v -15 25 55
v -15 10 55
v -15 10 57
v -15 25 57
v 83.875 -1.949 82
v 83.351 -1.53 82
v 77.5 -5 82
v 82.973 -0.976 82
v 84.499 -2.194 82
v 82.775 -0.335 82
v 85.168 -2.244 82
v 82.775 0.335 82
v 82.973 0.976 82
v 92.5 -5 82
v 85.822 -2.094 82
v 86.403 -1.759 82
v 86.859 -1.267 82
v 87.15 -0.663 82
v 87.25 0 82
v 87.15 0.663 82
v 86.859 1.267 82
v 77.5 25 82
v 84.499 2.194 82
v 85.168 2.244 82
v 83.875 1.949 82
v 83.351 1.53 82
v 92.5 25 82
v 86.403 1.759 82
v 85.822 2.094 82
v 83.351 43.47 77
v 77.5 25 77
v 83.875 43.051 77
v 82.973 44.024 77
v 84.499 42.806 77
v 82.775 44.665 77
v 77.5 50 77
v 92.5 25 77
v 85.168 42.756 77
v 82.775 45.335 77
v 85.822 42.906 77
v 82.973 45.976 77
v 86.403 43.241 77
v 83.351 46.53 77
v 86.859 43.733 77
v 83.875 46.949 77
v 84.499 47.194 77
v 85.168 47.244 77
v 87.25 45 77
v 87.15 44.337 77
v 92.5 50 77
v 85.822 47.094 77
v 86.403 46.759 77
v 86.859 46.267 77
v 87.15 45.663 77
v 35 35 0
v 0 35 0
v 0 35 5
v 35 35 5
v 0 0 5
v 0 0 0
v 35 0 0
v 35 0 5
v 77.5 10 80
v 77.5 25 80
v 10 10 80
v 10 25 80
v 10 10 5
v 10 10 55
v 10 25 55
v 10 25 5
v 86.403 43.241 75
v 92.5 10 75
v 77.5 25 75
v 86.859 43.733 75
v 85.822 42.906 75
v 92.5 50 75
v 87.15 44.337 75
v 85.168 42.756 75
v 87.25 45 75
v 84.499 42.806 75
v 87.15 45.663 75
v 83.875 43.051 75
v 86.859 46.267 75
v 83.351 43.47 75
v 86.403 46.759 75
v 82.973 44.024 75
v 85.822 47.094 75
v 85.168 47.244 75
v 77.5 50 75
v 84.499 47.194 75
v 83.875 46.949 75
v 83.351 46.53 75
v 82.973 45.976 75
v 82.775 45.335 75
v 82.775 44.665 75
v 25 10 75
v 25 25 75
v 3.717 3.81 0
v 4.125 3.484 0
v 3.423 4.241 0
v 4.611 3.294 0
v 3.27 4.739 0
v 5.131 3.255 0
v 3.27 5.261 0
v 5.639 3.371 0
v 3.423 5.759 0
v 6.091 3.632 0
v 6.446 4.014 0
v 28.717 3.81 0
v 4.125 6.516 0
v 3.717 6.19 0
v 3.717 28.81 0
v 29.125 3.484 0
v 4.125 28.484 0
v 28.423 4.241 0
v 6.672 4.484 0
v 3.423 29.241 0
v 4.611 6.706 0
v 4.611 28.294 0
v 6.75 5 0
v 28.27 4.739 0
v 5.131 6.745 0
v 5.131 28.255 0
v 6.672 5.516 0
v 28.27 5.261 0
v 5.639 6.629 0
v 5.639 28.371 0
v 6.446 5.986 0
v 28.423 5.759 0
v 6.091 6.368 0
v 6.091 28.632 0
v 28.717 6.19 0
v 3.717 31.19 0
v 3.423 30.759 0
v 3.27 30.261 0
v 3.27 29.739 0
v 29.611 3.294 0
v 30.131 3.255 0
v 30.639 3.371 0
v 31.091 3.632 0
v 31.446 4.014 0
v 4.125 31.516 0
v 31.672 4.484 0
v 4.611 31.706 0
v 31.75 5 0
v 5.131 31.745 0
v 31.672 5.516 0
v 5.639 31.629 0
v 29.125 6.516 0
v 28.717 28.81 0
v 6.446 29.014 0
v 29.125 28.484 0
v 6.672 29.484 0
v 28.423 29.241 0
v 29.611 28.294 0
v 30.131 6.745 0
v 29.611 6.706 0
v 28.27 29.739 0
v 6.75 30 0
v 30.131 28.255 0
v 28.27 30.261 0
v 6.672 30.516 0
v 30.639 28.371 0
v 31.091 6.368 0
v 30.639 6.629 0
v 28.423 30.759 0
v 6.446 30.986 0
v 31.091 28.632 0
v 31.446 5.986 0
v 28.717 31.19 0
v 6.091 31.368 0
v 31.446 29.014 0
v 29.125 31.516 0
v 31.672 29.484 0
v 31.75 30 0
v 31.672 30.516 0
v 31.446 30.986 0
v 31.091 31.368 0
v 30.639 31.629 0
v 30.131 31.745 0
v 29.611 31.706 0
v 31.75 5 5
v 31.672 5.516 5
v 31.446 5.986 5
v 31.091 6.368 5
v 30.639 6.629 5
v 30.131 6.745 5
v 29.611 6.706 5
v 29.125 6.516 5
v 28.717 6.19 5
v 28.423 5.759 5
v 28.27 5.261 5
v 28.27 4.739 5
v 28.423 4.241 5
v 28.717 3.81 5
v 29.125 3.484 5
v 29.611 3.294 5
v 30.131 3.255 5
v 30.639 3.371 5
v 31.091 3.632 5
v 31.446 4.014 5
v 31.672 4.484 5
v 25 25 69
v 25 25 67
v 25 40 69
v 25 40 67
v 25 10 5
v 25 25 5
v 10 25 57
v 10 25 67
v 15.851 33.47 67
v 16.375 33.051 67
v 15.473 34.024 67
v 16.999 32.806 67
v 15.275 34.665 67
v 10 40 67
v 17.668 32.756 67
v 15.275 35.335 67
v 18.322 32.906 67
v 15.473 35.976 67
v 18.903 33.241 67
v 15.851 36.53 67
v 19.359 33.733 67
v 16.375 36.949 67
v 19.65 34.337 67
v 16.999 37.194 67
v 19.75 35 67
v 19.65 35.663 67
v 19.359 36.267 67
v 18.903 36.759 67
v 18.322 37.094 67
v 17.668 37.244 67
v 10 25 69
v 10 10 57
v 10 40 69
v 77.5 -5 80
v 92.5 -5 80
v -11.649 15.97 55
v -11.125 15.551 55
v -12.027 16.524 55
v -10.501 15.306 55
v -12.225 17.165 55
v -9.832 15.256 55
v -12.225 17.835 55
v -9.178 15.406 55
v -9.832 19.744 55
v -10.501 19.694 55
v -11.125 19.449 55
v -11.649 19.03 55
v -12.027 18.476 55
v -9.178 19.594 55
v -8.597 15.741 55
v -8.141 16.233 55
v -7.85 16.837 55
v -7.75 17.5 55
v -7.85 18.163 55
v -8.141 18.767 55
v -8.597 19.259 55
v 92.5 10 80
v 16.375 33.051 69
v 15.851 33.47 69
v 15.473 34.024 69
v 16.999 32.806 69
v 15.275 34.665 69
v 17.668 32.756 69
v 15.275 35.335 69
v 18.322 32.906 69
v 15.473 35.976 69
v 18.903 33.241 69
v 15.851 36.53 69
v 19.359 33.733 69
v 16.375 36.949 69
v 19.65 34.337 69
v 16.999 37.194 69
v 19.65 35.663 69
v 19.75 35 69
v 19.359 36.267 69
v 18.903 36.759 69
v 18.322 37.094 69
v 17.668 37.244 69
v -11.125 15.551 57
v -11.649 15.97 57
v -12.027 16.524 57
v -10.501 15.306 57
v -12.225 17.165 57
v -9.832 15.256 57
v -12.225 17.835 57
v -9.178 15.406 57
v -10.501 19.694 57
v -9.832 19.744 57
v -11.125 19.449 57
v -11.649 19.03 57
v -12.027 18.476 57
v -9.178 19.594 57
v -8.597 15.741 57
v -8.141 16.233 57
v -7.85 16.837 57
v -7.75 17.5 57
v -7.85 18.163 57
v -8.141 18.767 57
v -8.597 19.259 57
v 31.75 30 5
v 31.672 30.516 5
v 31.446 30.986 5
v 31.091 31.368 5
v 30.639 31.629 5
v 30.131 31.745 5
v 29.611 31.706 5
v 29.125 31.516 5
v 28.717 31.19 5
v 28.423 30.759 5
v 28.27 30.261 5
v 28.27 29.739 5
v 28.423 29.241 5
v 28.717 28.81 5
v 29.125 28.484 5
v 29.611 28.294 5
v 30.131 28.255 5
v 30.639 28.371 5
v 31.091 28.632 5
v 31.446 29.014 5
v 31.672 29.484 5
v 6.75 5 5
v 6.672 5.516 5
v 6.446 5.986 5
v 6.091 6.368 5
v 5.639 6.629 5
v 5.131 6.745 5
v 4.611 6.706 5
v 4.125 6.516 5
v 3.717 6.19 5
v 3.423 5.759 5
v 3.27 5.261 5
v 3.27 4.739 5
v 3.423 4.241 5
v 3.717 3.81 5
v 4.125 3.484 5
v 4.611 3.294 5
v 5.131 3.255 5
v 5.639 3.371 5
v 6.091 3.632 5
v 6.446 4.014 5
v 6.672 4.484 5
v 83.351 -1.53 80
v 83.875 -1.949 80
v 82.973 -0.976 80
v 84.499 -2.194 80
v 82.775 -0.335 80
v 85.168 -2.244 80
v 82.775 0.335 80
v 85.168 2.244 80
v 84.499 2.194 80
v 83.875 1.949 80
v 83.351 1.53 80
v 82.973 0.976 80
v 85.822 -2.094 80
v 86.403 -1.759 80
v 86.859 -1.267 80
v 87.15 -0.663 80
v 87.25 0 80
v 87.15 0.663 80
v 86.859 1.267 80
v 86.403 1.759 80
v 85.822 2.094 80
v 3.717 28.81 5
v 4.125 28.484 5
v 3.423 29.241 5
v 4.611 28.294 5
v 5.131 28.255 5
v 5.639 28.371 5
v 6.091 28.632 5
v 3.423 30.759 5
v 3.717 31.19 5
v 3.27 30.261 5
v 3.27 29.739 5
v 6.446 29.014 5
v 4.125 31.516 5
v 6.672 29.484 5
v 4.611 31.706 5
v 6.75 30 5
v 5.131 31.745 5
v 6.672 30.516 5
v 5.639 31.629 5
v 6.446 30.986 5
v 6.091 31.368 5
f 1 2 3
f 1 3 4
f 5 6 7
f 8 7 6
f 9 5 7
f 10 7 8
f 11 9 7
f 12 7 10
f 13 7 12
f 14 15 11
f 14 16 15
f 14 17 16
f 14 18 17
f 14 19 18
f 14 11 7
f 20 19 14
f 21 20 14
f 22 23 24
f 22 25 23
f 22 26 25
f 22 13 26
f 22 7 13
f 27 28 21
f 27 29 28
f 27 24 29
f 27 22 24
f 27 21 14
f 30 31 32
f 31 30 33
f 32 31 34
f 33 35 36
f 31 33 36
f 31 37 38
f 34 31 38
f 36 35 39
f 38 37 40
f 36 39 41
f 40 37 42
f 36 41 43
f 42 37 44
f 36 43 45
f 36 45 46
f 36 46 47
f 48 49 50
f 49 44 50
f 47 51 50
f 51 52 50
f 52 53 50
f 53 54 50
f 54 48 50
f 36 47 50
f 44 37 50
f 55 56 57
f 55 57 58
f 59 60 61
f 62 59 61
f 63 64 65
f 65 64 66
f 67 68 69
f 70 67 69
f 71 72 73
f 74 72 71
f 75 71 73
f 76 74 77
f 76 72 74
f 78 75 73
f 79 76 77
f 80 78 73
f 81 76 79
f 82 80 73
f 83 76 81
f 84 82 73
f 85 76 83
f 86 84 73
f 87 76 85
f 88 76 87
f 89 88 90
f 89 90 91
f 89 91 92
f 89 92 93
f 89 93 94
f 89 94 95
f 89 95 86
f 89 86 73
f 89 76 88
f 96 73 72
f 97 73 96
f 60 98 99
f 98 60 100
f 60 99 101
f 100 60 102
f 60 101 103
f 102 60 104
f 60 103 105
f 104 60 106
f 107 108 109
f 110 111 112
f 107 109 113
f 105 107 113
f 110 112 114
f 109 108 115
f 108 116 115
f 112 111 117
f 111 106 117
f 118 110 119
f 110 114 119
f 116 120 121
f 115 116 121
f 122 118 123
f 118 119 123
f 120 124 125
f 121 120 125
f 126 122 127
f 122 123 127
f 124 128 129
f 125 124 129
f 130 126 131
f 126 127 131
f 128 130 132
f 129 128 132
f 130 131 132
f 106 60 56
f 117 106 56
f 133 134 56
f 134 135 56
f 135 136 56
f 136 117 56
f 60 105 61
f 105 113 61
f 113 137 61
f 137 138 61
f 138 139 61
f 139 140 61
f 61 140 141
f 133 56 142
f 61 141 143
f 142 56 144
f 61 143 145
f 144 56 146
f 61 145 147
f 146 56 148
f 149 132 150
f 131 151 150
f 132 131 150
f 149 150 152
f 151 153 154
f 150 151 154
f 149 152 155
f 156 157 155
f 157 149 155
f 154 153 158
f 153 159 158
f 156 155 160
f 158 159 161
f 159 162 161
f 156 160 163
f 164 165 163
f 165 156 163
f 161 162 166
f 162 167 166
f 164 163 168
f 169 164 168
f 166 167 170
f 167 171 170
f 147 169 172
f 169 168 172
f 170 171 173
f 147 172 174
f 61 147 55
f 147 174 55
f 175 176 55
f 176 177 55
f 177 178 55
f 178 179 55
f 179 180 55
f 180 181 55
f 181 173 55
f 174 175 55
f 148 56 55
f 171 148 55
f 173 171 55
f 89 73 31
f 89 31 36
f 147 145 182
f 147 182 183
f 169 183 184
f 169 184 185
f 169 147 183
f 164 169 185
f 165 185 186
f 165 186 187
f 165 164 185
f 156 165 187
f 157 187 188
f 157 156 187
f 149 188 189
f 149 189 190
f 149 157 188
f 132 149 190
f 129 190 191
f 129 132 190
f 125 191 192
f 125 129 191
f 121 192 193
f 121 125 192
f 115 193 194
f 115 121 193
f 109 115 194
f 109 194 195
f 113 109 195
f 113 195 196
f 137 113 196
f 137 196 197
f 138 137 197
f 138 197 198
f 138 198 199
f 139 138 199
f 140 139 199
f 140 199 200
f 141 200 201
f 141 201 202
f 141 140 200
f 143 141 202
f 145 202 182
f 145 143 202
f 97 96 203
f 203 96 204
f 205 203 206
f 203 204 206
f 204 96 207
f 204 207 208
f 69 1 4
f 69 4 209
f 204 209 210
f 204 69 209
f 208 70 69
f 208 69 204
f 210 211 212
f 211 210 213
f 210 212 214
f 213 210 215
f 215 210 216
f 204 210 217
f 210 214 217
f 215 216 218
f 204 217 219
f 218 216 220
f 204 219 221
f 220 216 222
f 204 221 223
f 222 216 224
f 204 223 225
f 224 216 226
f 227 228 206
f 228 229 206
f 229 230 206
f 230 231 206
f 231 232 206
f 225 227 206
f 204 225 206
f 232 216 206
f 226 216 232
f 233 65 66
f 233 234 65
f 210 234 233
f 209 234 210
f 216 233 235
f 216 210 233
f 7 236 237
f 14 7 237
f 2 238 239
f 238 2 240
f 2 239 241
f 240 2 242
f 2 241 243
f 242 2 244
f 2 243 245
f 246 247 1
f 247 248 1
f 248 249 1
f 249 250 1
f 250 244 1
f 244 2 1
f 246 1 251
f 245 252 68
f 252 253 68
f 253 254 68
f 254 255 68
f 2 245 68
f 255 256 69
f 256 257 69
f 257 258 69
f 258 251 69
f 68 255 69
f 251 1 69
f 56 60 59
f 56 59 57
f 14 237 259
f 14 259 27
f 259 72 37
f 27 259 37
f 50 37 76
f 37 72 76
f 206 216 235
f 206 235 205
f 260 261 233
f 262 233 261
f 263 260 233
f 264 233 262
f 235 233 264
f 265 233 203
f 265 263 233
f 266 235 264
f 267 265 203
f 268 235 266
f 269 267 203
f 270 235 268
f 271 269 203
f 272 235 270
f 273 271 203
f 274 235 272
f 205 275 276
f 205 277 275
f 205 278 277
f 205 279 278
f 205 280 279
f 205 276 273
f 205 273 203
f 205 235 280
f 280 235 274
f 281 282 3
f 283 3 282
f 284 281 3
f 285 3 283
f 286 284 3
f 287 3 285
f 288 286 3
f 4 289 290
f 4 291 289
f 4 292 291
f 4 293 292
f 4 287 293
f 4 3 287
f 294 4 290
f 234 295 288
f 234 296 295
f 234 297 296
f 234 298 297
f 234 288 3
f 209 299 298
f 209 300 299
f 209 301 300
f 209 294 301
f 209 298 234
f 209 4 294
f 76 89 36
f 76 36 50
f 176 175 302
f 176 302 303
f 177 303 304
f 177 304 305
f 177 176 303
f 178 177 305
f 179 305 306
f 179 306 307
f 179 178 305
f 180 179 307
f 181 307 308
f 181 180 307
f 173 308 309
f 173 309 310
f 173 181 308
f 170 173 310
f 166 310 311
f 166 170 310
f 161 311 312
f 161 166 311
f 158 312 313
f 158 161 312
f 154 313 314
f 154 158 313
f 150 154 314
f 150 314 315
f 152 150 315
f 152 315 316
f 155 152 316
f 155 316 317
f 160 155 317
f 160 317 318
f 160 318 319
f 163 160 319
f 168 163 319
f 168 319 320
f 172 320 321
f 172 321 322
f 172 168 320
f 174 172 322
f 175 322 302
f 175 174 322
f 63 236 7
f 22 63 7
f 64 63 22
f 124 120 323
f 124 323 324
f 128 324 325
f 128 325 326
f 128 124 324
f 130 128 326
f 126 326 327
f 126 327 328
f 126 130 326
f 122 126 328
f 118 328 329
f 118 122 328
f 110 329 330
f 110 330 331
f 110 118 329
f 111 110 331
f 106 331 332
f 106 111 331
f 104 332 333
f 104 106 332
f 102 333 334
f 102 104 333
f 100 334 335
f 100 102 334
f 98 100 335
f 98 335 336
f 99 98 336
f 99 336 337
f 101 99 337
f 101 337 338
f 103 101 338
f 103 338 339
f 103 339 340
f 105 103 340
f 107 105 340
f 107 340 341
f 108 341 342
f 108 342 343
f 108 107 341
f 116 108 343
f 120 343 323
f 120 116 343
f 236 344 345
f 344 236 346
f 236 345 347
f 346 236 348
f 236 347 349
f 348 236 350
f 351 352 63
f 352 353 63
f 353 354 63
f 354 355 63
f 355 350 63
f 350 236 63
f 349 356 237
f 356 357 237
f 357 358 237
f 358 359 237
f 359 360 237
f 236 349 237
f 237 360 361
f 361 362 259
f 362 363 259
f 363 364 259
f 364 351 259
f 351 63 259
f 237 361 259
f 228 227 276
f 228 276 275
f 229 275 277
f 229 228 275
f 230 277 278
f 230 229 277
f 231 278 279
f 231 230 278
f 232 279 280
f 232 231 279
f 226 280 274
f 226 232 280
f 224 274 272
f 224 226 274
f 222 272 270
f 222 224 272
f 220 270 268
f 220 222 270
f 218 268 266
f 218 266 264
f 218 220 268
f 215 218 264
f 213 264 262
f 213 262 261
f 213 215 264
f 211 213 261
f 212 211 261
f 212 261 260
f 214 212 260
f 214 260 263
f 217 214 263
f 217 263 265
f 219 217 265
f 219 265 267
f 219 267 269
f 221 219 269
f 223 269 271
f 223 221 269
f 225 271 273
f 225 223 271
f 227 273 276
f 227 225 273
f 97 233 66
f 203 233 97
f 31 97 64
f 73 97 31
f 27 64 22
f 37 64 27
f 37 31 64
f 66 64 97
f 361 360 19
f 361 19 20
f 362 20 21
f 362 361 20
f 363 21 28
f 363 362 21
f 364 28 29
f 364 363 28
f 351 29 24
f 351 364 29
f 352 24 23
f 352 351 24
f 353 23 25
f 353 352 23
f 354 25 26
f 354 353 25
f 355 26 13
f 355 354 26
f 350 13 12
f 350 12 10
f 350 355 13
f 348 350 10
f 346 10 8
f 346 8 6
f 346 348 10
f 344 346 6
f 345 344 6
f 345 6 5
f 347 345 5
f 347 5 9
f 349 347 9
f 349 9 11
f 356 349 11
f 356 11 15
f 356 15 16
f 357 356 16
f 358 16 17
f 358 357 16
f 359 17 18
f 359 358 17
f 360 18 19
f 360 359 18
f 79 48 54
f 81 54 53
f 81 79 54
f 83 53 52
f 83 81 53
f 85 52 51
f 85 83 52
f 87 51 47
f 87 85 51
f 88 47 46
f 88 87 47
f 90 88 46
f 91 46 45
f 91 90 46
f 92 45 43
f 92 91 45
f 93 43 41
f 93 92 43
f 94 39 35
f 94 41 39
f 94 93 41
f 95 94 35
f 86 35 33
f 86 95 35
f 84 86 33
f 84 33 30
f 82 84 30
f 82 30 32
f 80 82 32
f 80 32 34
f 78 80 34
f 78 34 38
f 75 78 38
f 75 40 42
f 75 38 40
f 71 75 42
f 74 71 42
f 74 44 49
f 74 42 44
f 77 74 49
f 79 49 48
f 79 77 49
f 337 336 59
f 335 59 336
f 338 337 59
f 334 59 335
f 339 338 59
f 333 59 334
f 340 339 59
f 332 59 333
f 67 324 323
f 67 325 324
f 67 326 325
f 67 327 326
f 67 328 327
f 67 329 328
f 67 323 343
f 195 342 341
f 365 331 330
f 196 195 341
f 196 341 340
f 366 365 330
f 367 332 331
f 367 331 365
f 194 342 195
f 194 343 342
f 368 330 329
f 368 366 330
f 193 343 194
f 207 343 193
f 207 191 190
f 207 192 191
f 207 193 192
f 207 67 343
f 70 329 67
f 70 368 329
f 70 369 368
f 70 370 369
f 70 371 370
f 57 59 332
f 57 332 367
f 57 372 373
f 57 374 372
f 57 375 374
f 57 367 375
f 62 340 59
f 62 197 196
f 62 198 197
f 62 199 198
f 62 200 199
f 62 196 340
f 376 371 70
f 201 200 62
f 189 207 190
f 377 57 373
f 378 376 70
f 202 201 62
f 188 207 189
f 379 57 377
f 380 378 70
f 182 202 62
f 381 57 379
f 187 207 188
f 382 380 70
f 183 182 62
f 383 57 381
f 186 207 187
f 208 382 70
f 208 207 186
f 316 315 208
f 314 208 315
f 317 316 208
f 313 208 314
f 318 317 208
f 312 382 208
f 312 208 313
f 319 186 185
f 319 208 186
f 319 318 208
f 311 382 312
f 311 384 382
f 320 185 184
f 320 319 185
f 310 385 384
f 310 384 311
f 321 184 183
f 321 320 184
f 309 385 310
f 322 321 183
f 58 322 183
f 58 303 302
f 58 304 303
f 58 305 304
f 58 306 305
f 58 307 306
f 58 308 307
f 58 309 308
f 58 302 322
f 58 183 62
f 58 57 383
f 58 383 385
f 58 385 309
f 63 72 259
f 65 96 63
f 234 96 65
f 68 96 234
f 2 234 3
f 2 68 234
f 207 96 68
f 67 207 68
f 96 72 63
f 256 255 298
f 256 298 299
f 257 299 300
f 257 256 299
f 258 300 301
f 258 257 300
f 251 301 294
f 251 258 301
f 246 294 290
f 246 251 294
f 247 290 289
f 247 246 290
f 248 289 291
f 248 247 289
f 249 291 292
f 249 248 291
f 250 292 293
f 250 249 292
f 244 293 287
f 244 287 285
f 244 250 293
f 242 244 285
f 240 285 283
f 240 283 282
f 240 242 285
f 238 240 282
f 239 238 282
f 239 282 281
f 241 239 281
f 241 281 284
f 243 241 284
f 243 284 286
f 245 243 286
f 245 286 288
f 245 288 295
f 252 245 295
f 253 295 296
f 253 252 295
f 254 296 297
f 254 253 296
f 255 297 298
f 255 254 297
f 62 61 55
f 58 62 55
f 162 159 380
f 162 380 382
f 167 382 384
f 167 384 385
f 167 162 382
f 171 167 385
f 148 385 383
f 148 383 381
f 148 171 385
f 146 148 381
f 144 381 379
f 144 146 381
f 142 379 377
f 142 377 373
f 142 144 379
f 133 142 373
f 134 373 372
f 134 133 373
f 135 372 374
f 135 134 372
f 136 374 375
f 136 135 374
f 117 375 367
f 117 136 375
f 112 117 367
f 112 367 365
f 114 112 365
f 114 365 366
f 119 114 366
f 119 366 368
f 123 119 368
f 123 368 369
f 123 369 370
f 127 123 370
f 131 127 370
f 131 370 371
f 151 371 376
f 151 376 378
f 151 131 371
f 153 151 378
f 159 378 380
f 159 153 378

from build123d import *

# Parameters (mm, degrees)
SKETCH_W     = 35
SKETCH_H     = 35
SKETCH_R     = 1.75
PAD_DEPTH    = 5
SKETCH001_W  = 15
SKETCH001_H  = 15
PAD001_DEPTH = 50
SKETCH002_W  = 40
SKETCH002_H  = 15
SKETCH002_R  = 2.25
PAD002_DEPTH = 2
SKETCH003_W  = 15
SKETCH003_H  = 15
PAD003_DEPTH = 10
SKETCH004_W  = 15
SKETCH004_H  = 30
SKETCH004_R  = 2.25
PAD004_DEPTH = 2
SKETCH005_W  = 15
SKETCH005_H  = 15
PAD005_DEPTH = 6
SKETCH006_R  = 2.25
PAD006_DEPTH = 5
SKETCH007_W  = 15
SKETCH007_H  = 30
SKETCH007_R  = 2.25
PAD007_DEPTH = 2
SKETCH008_W  = 25
SKETCH008_H  = 3
POCKET_DEPTH = 25


with BuildPart() as part:
    # Sketch → Pad (new body)
    with BuildSketch(Plane.XY):
        with Locations((17.5, 17.5)):
            Rectangle(SKETCH_W, SKETCH_H)
        with Locations((5, 5)):
            Circle(SKETCH_R, mode=Mode.SUBTRACT)
        with Locations((5, 30)):
            Circle(SKETCH_R, mode=Mode.SUBTRACT)
        with Locations((30, 30)):
            Circle(SKETCH_R, mode=Mode.SUBTRACT)
        with Locations((30, 5)):
            Circle(SKETCH_R, mode=Mode.SUBTRACT)
    extrude(amount=PAD_DEPTH)

    # Sketch001 (on Face10 of Pad) → Pad001 (join)
    with BuildSketch(Plane.XY.offset(5)):
        with Locations((17.5, 17.5)):
            Rectangle(SKETCH001_W, SKETCH001_H)
    extrude(amount=PAD001_DEPTH)

    # Sketch002 (on Face15 of Pad001) → Pad002 (join)
    with BuildSketch(Plane.XY.offset(55)):
        with Locations((5, 17.5)):
            Rectangle(SKETCH002_W, SKETCH002_H)
        with Locations((-10, 17.5)):
            Circle(SKETCH002_R, mode=Mode.SUBTRACT)
    extrude(amount=PAD002_DEPTH)

    # Sketch003 (on Face21 of Pad002) → Pad003 (join)
    with BuildSketch(Plane.XY.offset(57)):
        with Locations((17.5, 17.5)):
            Rectangle(SKETCH003_W, SKETCH003_H)
    extrude(amount=PAD003_DEPTH)

    # Sketch004 (on Face26 of Pad003) → Pad004 (join)
    with BuildSketch(Plane.XY.offset(67)):
        with Locations((17.5, 25)):
            Rectangle(SKETCH004_W, SKETCH004_H)
        with Locations((17.5, 35)):
            Circle(SKETCH004_R, mode=Mode.SUBTRACT)
    extrude(amount=PAD004_DEPTH)

    # Sketch005 (on Face30 of Pad004) → Pad005 (join)
    with BuildSketch(Plane.XY.offset(69)):
        with Locations((17.5, 17.5)):
            Rectangle(SKETCH005_W, SKETCH005_H)
    extrude(amount=PAD005_DEPTH)

    # Sketch006 (on Face36 of Pad005) → Pad006 (join)
    with BuildSketch(Plane.XY.offset(75)):
        Polygon((10, 25), (77.5, 25), (77.5, 50), (92.5, 50), (92.5, 10), (10, 10), align=None)
        with Locations((85, 45)):
            Circle(SKETCH006_R, mode=Mode.SUBTRACT)
    extrude(amount=PAD006_DEPTH)

    # Sketch007 (on Face41 of Pad006) → Pad007 (join)
    with BuildSketch(Plane.XY.offset(80)):
        with Locations((85, 10)):
            Rectangle(SKETCH007_W, SKETCH007_H)
        with Locations((85, 0)):
            Circle(SKETCH007_R, mode=Mode.SUBTRACT)
    extrude(amount=PAD007_DEPTH)

    # Sketch008 (on Face40 of Pad007) → Pocket (cut)
    with BuildSketch(Plane.YZ.offset(92.5)):
        with Locations((37.5, 78.5)):
            Rectangle(SKETCH008_W, SKETCH008_H)
    extrude(amount=-POCKET_DEPTH, mode=Mode.SUBTRACT)


solid = part.part
